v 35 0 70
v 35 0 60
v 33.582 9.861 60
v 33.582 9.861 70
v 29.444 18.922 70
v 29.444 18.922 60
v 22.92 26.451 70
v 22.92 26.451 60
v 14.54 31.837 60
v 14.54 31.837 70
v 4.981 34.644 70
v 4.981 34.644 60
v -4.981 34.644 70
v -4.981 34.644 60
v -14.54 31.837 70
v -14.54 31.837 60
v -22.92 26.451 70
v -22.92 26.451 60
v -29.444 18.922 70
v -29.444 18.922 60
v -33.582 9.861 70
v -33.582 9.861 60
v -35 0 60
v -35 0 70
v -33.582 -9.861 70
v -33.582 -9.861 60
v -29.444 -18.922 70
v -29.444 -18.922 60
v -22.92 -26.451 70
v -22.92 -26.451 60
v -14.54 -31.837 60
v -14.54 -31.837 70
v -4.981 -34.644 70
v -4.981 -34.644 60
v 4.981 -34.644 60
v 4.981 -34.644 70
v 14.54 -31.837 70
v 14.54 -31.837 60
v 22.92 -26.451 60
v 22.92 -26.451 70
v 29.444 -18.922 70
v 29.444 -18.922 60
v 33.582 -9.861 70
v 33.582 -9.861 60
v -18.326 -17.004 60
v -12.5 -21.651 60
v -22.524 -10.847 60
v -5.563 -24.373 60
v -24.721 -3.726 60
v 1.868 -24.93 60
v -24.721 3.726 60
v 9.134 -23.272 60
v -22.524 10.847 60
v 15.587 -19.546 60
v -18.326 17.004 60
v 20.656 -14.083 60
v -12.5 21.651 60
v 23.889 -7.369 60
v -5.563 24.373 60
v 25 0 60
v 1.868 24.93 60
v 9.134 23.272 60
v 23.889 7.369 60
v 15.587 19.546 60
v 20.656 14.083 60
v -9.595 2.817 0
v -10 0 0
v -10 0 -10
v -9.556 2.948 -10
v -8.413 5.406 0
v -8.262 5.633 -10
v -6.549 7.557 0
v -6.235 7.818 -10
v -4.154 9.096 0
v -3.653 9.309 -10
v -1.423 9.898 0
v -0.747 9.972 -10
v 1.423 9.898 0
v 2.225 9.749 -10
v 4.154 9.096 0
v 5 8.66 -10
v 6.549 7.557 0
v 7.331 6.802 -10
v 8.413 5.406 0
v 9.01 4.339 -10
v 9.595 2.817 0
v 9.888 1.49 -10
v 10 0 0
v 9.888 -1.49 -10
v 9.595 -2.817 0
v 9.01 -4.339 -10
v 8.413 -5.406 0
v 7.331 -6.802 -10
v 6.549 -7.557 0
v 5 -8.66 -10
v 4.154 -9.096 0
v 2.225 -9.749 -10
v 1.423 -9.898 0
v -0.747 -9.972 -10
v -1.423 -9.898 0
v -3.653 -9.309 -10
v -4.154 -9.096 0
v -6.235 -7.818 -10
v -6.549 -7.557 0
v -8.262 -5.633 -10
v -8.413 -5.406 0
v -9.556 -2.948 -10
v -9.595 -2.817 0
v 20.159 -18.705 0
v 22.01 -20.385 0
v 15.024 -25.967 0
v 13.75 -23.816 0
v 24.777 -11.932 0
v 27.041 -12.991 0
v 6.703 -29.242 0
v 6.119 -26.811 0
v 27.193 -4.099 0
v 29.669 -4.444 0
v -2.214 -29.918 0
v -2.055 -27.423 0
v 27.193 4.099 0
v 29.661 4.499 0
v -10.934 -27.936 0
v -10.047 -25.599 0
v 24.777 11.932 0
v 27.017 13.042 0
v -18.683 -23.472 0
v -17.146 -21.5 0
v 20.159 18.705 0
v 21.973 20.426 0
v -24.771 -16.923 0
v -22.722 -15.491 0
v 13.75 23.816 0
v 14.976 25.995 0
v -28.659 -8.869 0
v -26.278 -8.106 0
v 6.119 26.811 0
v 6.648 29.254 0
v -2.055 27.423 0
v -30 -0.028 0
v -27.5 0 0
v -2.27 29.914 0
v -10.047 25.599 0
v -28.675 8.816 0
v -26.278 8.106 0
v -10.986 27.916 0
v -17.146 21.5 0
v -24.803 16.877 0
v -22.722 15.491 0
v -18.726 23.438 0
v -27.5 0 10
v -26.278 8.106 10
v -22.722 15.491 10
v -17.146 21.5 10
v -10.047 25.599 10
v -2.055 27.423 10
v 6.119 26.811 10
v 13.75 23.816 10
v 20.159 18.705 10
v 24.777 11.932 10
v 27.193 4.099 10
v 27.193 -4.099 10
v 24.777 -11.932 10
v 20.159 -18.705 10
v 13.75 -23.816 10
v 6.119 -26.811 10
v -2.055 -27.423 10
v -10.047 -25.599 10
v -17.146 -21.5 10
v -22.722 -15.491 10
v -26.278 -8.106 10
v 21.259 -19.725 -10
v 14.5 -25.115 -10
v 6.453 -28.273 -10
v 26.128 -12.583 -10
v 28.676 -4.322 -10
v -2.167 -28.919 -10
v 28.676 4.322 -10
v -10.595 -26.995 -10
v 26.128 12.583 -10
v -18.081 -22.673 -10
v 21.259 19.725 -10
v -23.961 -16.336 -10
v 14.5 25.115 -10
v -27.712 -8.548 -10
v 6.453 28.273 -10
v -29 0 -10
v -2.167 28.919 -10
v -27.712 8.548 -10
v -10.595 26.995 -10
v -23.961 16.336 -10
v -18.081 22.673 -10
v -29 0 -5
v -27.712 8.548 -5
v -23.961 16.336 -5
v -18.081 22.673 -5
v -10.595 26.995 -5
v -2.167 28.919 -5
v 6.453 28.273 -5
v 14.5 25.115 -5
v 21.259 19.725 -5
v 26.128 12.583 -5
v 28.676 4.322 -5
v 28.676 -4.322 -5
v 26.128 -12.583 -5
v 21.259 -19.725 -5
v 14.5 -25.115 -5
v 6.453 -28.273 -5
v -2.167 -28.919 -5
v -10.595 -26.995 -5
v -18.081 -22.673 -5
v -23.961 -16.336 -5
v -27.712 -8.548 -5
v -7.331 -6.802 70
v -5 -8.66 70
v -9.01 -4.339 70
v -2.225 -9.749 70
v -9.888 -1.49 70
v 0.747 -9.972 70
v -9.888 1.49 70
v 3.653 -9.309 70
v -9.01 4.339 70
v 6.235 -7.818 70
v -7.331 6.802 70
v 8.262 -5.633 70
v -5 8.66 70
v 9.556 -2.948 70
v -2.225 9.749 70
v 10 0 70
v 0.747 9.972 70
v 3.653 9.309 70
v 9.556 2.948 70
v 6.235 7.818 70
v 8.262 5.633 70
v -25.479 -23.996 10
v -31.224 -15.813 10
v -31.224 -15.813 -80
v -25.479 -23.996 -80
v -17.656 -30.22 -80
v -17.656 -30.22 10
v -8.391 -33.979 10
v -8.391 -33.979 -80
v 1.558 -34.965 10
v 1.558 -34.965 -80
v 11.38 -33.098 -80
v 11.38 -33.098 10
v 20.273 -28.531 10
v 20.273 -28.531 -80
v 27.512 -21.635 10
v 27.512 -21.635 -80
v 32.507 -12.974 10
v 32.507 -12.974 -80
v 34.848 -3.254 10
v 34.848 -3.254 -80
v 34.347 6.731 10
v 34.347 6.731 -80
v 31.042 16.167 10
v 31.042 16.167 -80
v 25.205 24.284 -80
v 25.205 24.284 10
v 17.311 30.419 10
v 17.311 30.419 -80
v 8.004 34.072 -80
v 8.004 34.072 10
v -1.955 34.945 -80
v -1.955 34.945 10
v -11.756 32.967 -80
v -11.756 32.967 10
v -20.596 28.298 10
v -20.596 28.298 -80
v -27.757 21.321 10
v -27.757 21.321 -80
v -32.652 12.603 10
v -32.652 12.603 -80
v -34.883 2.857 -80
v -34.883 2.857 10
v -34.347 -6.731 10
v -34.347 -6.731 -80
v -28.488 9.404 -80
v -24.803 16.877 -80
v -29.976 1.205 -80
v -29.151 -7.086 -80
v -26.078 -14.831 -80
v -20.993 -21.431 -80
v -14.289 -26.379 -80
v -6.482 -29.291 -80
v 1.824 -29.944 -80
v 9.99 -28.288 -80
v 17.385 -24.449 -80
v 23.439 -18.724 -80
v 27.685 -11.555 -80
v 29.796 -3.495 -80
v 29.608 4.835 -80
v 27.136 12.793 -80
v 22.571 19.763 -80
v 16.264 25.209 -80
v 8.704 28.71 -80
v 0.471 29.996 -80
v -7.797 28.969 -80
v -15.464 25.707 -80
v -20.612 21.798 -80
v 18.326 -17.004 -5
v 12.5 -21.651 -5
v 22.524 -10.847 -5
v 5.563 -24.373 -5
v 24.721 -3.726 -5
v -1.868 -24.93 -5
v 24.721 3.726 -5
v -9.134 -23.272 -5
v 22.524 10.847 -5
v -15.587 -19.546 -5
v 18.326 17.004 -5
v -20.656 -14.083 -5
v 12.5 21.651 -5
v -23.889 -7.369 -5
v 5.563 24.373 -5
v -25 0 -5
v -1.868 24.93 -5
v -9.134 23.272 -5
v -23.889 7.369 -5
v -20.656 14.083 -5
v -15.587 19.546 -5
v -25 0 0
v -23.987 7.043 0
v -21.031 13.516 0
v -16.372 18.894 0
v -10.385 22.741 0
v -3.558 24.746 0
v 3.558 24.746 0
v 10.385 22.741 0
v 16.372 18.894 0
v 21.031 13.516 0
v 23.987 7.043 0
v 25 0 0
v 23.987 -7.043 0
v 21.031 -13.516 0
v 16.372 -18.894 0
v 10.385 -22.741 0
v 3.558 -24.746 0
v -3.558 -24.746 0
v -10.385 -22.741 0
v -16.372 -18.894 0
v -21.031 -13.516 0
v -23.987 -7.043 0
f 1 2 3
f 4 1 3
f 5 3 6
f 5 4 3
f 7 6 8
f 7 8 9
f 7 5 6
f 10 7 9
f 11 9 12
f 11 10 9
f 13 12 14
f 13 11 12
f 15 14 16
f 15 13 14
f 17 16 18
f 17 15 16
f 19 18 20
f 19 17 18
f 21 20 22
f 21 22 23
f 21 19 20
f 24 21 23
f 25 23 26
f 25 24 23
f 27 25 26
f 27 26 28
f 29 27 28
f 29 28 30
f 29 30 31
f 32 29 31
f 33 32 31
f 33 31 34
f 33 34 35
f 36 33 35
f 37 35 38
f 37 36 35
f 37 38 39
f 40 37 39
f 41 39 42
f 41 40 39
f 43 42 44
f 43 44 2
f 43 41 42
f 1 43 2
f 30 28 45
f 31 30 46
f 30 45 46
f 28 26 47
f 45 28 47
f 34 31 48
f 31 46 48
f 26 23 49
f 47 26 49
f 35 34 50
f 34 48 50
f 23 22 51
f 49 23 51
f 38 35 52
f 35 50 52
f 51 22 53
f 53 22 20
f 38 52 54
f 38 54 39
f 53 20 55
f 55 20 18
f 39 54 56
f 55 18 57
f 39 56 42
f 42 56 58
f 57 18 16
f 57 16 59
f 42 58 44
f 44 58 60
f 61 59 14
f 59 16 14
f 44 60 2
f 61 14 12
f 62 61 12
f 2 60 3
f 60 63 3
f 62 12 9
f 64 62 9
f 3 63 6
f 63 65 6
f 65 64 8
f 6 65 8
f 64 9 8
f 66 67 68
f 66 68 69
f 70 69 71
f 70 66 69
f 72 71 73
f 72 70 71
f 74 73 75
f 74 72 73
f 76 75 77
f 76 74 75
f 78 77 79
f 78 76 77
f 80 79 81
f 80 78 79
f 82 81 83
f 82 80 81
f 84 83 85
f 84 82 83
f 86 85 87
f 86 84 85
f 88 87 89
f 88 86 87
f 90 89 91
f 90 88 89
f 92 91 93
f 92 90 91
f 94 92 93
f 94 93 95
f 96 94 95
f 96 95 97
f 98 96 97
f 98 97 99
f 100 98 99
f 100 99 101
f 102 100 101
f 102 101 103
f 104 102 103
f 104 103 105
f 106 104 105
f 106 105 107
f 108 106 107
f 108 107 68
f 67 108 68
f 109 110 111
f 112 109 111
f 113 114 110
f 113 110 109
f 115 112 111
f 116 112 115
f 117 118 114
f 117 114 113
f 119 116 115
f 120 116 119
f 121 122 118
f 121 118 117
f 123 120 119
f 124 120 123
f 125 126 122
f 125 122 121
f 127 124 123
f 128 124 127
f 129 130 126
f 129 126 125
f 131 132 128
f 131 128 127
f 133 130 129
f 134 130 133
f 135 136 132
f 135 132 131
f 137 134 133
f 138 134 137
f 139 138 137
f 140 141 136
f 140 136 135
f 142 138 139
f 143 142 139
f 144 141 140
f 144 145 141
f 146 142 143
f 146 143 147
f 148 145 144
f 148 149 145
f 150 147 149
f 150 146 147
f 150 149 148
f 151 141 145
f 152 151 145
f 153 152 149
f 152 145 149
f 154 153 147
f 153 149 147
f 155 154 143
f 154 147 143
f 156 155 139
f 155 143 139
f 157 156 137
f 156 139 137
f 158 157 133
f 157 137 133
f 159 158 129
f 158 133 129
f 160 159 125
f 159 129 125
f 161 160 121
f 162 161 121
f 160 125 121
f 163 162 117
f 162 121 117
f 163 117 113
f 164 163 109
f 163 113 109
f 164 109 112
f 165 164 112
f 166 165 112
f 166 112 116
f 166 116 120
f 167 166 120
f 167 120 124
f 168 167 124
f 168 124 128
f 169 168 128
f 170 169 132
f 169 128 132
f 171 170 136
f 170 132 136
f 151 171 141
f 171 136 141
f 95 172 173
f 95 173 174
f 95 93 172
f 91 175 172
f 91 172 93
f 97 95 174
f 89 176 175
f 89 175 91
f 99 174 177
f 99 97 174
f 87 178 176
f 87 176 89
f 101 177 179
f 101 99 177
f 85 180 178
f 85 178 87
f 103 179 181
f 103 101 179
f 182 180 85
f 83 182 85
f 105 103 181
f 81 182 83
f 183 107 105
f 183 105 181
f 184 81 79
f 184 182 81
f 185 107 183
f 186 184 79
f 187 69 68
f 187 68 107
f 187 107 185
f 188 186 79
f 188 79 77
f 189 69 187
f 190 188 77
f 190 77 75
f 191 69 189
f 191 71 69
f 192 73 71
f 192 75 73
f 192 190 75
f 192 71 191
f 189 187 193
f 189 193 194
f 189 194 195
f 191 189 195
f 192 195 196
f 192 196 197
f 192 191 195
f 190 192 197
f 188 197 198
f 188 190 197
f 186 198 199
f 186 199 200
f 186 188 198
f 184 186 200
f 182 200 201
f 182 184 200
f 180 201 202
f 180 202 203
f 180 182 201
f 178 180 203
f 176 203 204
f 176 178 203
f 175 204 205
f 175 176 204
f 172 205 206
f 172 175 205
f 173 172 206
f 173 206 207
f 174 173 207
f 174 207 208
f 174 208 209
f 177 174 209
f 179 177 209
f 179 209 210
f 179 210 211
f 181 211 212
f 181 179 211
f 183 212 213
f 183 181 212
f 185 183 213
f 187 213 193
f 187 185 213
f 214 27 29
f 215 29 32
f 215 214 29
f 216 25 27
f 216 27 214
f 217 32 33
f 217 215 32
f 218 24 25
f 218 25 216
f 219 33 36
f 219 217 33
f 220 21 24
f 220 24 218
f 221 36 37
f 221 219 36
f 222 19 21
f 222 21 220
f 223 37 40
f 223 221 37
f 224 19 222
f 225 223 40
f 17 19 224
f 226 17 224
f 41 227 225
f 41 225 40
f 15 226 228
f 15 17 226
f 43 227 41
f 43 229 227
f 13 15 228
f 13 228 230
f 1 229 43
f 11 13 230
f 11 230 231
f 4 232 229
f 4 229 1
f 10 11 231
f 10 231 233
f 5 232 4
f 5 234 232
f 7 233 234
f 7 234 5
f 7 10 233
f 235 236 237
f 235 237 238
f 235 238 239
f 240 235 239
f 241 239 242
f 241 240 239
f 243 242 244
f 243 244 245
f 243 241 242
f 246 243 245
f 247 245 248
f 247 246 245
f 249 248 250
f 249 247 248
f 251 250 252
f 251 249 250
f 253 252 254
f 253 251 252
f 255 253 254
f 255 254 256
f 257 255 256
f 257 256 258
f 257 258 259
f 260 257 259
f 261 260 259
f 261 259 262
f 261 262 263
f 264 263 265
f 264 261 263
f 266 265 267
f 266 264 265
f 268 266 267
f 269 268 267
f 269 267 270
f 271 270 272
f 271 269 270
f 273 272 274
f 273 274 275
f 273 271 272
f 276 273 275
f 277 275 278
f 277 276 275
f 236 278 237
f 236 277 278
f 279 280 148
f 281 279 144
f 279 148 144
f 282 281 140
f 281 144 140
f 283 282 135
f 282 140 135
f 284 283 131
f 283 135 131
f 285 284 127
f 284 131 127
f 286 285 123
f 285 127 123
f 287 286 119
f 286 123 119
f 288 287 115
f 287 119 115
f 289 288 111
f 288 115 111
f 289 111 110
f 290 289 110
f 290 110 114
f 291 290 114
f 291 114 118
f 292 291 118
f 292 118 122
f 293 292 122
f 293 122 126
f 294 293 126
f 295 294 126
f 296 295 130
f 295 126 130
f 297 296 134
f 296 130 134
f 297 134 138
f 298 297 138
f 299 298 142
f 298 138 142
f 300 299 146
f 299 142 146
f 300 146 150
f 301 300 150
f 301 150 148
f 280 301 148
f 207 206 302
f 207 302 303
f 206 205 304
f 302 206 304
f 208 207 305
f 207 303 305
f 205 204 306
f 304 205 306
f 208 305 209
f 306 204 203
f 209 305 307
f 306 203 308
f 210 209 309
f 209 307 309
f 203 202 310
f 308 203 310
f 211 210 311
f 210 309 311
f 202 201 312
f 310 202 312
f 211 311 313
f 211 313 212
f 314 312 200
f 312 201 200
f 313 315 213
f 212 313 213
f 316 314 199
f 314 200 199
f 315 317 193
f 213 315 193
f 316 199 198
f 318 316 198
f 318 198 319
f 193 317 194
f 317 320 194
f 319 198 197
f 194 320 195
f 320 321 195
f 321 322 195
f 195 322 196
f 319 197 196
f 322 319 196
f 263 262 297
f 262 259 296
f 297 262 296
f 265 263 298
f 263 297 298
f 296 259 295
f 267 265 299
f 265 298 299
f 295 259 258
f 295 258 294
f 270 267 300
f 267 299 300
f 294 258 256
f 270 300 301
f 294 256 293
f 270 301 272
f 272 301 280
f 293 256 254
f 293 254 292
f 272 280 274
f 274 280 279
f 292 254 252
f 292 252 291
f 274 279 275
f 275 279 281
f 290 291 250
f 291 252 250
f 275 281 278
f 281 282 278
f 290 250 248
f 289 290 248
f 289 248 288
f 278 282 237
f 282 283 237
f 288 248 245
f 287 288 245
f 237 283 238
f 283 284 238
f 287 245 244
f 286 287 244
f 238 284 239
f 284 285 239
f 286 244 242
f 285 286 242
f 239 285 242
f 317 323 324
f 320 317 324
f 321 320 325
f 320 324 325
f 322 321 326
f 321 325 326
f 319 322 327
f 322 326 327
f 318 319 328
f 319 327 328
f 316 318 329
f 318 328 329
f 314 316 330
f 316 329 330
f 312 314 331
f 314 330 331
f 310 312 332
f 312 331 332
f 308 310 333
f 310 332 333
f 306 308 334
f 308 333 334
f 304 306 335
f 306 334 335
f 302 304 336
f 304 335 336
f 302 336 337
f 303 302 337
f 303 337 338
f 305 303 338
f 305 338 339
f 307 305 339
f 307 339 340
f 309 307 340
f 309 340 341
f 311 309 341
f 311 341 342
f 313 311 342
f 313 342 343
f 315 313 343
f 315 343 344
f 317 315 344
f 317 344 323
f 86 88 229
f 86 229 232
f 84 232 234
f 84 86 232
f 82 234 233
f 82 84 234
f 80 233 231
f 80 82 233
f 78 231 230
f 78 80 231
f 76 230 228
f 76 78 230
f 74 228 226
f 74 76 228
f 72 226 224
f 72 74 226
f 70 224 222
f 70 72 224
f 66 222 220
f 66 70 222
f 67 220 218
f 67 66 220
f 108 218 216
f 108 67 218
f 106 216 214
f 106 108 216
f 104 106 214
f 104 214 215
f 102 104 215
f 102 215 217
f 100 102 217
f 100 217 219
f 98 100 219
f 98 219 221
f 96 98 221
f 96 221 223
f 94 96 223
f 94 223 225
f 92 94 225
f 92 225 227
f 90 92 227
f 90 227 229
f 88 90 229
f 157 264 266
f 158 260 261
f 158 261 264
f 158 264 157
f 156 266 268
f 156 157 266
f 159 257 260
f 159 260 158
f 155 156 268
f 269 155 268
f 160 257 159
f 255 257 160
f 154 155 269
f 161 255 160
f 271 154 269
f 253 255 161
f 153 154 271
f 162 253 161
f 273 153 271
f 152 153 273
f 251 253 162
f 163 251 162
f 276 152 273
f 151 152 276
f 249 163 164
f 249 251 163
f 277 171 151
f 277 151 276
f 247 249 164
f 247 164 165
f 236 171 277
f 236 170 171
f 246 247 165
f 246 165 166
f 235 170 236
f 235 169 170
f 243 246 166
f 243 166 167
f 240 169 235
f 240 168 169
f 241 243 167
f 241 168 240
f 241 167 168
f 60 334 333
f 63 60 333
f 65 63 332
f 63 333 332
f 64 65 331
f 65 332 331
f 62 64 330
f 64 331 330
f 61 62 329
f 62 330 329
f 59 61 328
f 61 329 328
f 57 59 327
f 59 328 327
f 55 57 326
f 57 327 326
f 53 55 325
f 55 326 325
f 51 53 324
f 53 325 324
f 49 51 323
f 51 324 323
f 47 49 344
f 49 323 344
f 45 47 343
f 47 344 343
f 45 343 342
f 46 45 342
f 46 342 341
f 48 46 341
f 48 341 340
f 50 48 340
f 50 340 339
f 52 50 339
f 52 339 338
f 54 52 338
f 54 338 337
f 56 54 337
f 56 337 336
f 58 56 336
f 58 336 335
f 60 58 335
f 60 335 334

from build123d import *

# Parameters (mm, degrees)
CROQUIS1_R              = 25
CROQUIS1_R_2            = 10
SALIENTE_EXTRUIR1_DEPTH = 70
CROQUIS3_R              = 35
CROQUIS3_R_2            = 25
SALIENTE_EXTRUIR2_DEPTH = 10
CROQUIS4_R              = 30
CROQUIS4_R_2            = 27.5
SALIENTE_EXTRUIR3_DEPTH = 10
CROQUIS6_RX             = 35
CROQUIS6_RY             = 35
CROQUIS6_RX_2           = 30
CROQUIS6_RY_2           = 30
SALIENTE_EXTRUIR4_DEPTH = 90
CROQUIS7_R              = 25
CROQUIS7_R_2            = 10
SALIENTE_EXTRUIR5_DEPTH = 10
CROQUIS8_R              = 29
CROQUIS8_R_2            = 25
SALIENTE_EXTRUIR6_DEPTH = 5


with BuildPart() as part:
    # Croquis1 → Saliente-Extruir1 (new body)
    with BuildSketch(Plane.XY):
        Circle(CROQUIS1_R)
        Circle(CROQUIS1_R_2, mode=Mode.SUBTRACT)
    extrude(amount=SALIENTE_EXTRUIR1_DEPTH)

    # Croquis3 → Saliente-Extruir2 (add)
    with BuildSketch(Plane.XY.offset(70)):
        Circle(CROQUIS3_R)
        Circle(CROQUIS3_R_2, mode=Mode.SUBTRACT)
    extrude(amount=-SALIENTE_EXTRUIR2_DEPTH)

    # Croquis7 → Saliente-Extruir5 (add)
    with BuildSketch(Plane(origin=(0, 0, 0), x_dir=(-1, 0, 0), z_dir=(0, 0, -1))):
        Circle(CROQUIS7_R)
        Circle(CROQUIS7_R_2, mode=Mode.SUBTRACT)
    extrude(amount=SALIENTE_EXTRUIR5_DEPTH)

    # Croquis8 → Saliente-Extruir6 (add)
    with BuildSketch(Plane(origin=(0, 0, -10), x_dir=(-1, 0, 0), z_dir=(0, 0, -1))):
        Circle(CROQUIS8_R)
        Circle(CROQUIS8_R_2, mode=Mode.SUBTRACT)
    extrude(amount=-SALIENTE_EXTRUIR6_DEPTH)


with BuildPart() as body_2:
    # Croquis4 → Saliente-Extruir3 (new body)
    with BuildSketch(Plane(origin=(0, 0, 0), x_dir=(-1, 0, 0), z_dir=(0, 0, -1))):
        Circle(CROQUIS4_R)
        Circle(CROQUIS4_R_2, mode=Mode.SUBTRACT)
    extrude(amount=-SALIENTE_EXTRUIR3_DEPTH)

    # Croquis6 → Saliente-Extruir4 (add)
    with BuildSketch(Plane.XY.offset(10)):
        with Locations(Location((0, 0), (0, 0, -153.140460488))):
            Ellipse(CROQUIS6_RX, CROQUIS6_RY)
        with Locations(Location((0, 0), (0, 0, 145.767485293))):
            Ellipse(CROQUIS6_RX_2, CROQUIS6_RY_2, mode=Mode.SUBTRACT)
    extrude(amount=-SALIENTE_EXTRUIR4_DEPTH)


solid = Compound([part.part, body_2.part])
